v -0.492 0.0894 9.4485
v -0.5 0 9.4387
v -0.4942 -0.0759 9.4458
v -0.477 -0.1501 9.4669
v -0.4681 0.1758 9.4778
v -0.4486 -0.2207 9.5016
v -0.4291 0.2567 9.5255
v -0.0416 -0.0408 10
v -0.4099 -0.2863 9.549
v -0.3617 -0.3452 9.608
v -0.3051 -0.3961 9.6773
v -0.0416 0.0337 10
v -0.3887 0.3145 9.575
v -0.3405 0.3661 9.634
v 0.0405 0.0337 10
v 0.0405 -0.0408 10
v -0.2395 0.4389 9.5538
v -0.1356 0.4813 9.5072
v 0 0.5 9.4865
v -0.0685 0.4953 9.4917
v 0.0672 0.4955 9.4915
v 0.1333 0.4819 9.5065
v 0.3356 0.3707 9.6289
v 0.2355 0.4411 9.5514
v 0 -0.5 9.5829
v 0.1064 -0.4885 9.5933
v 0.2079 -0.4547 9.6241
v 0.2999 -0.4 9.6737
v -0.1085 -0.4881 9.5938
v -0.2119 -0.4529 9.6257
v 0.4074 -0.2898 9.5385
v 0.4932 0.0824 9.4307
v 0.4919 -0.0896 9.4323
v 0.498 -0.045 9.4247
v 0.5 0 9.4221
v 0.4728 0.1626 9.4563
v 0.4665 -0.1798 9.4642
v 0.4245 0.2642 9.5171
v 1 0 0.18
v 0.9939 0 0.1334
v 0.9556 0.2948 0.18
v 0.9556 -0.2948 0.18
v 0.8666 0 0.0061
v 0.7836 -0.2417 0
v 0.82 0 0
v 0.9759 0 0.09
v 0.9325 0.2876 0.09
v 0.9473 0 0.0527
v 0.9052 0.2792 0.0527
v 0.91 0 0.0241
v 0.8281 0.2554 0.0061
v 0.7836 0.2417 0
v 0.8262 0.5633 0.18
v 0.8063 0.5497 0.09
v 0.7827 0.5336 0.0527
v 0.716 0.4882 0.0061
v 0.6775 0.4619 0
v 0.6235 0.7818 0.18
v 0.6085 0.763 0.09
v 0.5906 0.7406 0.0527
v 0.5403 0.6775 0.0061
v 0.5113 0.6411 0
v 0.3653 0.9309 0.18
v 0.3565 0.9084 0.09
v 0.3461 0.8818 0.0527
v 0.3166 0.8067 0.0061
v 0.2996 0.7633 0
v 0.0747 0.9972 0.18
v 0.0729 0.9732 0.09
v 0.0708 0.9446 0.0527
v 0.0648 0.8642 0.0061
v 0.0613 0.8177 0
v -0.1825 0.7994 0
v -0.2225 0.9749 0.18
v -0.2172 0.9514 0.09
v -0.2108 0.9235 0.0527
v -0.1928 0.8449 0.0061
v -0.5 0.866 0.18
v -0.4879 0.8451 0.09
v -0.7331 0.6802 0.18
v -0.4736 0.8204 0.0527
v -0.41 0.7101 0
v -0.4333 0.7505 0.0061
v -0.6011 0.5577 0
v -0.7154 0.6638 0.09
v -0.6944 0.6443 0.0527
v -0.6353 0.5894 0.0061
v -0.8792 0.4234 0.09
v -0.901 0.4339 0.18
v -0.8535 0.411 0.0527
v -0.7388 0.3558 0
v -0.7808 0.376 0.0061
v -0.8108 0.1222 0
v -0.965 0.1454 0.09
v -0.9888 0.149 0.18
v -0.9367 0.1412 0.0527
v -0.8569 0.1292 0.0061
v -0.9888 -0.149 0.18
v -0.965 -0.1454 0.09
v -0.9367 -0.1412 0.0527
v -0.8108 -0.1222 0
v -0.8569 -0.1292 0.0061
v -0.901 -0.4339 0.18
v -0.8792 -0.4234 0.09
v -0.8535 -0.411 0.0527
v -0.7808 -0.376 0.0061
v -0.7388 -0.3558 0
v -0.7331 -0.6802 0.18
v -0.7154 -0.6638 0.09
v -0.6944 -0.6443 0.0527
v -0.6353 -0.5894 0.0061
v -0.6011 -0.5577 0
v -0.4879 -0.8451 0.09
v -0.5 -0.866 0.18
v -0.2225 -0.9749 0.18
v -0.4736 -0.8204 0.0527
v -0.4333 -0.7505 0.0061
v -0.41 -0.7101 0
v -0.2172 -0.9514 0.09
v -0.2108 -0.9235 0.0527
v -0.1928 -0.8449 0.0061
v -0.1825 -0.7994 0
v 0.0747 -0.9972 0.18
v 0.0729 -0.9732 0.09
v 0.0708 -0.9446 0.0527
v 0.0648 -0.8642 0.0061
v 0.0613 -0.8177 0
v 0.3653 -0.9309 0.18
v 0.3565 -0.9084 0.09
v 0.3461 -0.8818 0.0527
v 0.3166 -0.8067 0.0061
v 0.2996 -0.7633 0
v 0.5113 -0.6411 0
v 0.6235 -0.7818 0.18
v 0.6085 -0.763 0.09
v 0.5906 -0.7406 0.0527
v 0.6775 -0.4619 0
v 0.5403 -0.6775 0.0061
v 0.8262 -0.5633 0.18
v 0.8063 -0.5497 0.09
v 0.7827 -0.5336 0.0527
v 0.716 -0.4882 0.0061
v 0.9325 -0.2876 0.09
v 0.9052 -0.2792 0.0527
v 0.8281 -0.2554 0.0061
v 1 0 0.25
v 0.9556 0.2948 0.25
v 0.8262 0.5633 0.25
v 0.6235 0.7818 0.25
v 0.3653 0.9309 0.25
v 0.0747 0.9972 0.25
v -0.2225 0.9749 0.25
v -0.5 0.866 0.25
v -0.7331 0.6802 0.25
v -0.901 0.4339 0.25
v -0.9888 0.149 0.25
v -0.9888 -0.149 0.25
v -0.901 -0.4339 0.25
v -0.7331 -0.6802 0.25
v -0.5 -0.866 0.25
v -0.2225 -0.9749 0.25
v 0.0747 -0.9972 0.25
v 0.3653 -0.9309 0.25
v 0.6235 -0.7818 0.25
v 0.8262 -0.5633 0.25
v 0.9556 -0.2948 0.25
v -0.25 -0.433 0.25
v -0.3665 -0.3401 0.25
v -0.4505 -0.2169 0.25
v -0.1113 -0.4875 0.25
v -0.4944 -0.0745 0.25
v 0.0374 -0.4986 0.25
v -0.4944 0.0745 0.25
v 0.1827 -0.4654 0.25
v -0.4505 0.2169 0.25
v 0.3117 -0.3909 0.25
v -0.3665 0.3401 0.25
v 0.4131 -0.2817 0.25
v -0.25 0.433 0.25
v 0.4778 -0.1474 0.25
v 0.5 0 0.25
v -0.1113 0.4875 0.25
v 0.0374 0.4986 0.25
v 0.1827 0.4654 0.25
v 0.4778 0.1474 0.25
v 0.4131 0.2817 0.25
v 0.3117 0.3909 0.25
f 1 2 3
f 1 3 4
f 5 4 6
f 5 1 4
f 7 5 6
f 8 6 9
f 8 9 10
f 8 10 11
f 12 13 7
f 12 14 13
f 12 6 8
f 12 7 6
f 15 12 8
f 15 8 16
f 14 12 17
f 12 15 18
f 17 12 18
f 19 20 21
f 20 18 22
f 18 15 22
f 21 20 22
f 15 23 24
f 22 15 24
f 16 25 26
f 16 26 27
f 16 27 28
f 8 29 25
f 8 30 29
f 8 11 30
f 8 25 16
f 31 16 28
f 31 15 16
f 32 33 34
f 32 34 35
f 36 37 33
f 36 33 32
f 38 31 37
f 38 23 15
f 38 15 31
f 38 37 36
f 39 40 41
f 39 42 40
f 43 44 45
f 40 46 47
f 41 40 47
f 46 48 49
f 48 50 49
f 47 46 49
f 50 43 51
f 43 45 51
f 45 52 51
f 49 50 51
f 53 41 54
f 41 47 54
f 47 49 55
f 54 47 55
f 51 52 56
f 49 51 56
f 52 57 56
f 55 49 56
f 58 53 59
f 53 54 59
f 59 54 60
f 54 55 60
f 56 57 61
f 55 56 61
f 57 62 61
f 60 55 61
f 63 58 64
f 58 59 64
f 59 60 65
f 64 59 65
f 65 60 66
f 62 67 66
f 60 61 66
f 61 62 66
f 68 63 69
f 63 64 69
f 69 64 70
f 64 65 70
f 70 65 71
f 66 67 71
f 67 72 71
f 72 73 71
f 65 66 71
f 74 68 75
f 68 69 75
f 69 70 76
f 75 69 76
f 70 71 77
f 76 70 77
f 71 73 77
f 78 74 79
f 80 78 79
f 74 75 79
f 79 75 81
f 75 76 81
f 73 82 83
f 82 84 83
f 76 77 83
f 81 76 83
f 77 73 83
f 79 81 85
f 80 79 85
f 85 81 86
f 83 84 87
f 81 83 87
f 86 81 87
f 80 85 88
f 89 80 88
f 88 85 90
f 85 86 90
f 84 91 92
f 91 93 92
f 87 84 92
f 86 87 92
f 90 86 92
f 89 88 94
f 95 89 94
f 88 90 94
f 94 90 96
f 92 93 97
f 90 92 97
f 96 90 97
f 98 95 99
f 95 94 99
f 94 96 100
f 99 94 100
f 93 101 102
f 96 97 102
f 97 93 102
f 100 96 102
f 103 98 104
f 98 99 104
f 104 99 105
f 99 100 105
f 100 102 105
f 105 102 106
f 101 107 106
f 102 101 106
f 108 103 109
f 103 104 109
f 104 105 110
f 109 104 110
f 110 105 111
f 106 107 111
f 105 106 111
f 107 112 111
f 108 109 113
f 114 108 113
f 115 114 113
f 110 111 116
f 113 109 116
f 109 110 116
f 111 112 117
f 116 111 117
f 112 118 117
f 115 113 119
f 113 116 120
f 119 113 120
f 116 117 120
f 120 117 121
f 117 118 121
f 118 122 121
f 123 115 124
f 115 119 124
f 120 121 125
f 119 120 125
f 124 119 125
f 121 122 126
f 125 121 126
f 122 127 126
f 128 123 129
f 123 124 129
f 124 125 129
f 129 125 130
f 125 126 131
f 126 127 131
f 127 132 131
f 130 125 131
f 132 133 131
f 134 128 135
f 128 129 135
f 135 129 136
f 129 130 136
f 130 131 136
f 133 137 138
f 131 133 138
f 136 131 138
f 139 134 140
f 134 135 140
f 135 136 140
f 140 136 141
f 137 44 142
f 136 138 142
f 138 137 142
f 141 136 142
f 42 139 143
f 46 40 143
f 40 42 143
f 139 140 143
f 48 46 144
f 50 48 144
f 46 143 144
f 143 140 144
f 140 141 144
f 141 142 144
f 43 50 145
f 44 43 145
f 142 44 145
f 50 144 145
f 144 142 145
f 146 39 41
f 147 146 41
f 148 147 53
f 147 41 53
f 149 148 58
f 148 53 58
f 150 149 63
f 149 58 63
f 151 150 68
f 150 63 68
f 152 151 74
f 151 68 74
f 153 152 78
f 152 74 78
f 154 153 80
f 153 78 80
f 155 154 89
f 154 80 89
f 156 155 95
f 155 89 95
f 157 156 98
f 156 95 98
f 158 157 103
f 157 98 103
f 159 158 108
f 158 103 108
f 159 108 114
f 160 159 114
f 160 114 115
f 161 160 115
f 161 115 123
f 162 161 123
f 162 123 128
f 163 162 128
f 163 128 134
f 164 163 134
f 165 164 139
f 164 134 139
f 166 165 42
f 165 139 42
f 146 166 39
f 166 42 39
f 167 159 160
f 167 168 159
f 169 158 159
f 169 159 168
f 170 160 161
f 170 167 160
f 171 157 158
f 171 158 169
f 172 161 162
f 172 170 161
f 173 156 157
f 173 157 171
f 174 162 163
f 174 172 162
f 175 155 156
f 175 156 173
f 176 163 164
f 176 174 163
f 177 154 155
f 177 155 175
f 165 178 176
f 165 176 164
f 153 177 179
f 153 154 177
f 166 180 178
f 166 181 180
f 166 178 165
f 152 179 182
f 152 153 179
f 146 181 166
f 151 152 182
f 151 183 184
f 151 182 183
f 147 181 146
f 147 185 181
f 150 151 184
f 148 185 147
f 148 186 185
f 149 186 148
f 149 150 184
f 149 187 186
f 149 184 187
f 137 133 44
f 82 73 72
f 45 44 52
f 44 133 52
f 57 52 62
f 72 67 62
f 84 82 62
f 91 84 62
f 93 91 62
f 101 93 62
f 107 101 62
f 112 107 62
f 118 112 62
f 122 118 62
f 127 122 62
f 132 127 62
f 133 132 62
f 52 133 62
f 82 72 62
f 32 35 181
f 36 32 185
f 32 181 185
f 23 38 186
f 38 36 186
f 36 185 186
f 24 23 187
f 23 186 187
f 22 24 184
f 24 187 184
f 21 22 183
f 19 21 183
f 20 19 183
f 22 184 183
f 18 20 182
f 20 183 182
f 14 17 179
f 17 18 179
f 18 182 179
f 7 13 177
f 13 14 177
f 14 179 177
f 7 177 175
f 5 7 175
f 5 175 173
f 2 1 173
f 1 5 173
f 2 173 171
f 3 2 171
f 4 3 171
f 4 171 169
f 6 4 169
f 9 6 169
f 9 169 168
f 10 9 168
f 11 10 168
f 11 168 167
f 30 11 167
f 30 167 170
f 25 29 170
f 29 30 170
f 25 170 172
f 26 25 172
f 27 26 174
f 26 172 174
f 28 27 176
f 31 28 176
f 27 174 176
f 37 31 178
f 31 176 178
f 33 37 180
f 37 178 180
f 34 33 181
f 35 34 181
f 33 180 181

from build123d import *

# Parameters (mm, degrees)
F0_R          = 0.5
F1_DEPTH      = 10
F0_R_2        = 1
F2_DEPTH      = 0.25
F3_R          = 0.18
F5_DEPTH      = 50
F5_DEPTH_BACK = 2.6
F7_DEPTH      = 50
F7_DEPTH_BACK = 2.875


with BuildPart() as f1:
    # F0 (on Top) → F1 (new body)
    with BuildSketch(Plane.XY):
        Circle(F0_R)
    extrude(amount=F1_DEPTH)

    # F0 (on Top) → F2 (join)
    with BuildSketch(Plane.XY):
        Circle(F0_R_2)
        Circle(F0_R, mode=Mode.SUBTRACT)
    extrude(amount=F2_DEPTH)

    # F3
    f3_edges = [f1.edges().sort_by_distance(p)[0] for p in [
        (-1, 0, 0),
    ]]
    fillet(f3_edges, radius=F3_R)

    # F4 (on Front) → F5 (cut, two sides)
    with BuildSketch(Plane.XZ) as f5_sk:
        Polygon((-1.5745003475, 9.1303680092), (-0.7234219229, 9.1651063412), (0, 10.0509226322), (0.7182004047, 9.1477371752), (1.9166575512, 9.1477371752), (1.9166575512, 11.2493792549), (-1.5745003475, 11.2493792549), align=None)
    extrude(amount=-F5_DEPTH, mode=Mode.SUBTRACT)
    extrude(f5_sk.sketch, amount=F5_DEPTH_BACK, mode=Mode.SUBTRACT)

    # F6 (on Right) → F7 (cut, two sides)
    with BuildSketch(Plane.YZ) as f7_sk:
        Polygon((-1.6177080106, 9.4557581469), (-0.6982019986, 9.4029121101), (0, 10.0370543078), (0.6177483219, 9.3569022621), (1.5635710442, 9.3569022621), (1.5635710442, 11.0094053671), (-1.6177080106, 11.0094053671), align=None)
    extrude(amount=-F7_DEPTH, mode=Mode.SUBTRACT)
    extrude(f7_sk.sketch, amount=F7_DEPTH_BACK, mode=Mode.SUBTRACT)


solid = f1.part
